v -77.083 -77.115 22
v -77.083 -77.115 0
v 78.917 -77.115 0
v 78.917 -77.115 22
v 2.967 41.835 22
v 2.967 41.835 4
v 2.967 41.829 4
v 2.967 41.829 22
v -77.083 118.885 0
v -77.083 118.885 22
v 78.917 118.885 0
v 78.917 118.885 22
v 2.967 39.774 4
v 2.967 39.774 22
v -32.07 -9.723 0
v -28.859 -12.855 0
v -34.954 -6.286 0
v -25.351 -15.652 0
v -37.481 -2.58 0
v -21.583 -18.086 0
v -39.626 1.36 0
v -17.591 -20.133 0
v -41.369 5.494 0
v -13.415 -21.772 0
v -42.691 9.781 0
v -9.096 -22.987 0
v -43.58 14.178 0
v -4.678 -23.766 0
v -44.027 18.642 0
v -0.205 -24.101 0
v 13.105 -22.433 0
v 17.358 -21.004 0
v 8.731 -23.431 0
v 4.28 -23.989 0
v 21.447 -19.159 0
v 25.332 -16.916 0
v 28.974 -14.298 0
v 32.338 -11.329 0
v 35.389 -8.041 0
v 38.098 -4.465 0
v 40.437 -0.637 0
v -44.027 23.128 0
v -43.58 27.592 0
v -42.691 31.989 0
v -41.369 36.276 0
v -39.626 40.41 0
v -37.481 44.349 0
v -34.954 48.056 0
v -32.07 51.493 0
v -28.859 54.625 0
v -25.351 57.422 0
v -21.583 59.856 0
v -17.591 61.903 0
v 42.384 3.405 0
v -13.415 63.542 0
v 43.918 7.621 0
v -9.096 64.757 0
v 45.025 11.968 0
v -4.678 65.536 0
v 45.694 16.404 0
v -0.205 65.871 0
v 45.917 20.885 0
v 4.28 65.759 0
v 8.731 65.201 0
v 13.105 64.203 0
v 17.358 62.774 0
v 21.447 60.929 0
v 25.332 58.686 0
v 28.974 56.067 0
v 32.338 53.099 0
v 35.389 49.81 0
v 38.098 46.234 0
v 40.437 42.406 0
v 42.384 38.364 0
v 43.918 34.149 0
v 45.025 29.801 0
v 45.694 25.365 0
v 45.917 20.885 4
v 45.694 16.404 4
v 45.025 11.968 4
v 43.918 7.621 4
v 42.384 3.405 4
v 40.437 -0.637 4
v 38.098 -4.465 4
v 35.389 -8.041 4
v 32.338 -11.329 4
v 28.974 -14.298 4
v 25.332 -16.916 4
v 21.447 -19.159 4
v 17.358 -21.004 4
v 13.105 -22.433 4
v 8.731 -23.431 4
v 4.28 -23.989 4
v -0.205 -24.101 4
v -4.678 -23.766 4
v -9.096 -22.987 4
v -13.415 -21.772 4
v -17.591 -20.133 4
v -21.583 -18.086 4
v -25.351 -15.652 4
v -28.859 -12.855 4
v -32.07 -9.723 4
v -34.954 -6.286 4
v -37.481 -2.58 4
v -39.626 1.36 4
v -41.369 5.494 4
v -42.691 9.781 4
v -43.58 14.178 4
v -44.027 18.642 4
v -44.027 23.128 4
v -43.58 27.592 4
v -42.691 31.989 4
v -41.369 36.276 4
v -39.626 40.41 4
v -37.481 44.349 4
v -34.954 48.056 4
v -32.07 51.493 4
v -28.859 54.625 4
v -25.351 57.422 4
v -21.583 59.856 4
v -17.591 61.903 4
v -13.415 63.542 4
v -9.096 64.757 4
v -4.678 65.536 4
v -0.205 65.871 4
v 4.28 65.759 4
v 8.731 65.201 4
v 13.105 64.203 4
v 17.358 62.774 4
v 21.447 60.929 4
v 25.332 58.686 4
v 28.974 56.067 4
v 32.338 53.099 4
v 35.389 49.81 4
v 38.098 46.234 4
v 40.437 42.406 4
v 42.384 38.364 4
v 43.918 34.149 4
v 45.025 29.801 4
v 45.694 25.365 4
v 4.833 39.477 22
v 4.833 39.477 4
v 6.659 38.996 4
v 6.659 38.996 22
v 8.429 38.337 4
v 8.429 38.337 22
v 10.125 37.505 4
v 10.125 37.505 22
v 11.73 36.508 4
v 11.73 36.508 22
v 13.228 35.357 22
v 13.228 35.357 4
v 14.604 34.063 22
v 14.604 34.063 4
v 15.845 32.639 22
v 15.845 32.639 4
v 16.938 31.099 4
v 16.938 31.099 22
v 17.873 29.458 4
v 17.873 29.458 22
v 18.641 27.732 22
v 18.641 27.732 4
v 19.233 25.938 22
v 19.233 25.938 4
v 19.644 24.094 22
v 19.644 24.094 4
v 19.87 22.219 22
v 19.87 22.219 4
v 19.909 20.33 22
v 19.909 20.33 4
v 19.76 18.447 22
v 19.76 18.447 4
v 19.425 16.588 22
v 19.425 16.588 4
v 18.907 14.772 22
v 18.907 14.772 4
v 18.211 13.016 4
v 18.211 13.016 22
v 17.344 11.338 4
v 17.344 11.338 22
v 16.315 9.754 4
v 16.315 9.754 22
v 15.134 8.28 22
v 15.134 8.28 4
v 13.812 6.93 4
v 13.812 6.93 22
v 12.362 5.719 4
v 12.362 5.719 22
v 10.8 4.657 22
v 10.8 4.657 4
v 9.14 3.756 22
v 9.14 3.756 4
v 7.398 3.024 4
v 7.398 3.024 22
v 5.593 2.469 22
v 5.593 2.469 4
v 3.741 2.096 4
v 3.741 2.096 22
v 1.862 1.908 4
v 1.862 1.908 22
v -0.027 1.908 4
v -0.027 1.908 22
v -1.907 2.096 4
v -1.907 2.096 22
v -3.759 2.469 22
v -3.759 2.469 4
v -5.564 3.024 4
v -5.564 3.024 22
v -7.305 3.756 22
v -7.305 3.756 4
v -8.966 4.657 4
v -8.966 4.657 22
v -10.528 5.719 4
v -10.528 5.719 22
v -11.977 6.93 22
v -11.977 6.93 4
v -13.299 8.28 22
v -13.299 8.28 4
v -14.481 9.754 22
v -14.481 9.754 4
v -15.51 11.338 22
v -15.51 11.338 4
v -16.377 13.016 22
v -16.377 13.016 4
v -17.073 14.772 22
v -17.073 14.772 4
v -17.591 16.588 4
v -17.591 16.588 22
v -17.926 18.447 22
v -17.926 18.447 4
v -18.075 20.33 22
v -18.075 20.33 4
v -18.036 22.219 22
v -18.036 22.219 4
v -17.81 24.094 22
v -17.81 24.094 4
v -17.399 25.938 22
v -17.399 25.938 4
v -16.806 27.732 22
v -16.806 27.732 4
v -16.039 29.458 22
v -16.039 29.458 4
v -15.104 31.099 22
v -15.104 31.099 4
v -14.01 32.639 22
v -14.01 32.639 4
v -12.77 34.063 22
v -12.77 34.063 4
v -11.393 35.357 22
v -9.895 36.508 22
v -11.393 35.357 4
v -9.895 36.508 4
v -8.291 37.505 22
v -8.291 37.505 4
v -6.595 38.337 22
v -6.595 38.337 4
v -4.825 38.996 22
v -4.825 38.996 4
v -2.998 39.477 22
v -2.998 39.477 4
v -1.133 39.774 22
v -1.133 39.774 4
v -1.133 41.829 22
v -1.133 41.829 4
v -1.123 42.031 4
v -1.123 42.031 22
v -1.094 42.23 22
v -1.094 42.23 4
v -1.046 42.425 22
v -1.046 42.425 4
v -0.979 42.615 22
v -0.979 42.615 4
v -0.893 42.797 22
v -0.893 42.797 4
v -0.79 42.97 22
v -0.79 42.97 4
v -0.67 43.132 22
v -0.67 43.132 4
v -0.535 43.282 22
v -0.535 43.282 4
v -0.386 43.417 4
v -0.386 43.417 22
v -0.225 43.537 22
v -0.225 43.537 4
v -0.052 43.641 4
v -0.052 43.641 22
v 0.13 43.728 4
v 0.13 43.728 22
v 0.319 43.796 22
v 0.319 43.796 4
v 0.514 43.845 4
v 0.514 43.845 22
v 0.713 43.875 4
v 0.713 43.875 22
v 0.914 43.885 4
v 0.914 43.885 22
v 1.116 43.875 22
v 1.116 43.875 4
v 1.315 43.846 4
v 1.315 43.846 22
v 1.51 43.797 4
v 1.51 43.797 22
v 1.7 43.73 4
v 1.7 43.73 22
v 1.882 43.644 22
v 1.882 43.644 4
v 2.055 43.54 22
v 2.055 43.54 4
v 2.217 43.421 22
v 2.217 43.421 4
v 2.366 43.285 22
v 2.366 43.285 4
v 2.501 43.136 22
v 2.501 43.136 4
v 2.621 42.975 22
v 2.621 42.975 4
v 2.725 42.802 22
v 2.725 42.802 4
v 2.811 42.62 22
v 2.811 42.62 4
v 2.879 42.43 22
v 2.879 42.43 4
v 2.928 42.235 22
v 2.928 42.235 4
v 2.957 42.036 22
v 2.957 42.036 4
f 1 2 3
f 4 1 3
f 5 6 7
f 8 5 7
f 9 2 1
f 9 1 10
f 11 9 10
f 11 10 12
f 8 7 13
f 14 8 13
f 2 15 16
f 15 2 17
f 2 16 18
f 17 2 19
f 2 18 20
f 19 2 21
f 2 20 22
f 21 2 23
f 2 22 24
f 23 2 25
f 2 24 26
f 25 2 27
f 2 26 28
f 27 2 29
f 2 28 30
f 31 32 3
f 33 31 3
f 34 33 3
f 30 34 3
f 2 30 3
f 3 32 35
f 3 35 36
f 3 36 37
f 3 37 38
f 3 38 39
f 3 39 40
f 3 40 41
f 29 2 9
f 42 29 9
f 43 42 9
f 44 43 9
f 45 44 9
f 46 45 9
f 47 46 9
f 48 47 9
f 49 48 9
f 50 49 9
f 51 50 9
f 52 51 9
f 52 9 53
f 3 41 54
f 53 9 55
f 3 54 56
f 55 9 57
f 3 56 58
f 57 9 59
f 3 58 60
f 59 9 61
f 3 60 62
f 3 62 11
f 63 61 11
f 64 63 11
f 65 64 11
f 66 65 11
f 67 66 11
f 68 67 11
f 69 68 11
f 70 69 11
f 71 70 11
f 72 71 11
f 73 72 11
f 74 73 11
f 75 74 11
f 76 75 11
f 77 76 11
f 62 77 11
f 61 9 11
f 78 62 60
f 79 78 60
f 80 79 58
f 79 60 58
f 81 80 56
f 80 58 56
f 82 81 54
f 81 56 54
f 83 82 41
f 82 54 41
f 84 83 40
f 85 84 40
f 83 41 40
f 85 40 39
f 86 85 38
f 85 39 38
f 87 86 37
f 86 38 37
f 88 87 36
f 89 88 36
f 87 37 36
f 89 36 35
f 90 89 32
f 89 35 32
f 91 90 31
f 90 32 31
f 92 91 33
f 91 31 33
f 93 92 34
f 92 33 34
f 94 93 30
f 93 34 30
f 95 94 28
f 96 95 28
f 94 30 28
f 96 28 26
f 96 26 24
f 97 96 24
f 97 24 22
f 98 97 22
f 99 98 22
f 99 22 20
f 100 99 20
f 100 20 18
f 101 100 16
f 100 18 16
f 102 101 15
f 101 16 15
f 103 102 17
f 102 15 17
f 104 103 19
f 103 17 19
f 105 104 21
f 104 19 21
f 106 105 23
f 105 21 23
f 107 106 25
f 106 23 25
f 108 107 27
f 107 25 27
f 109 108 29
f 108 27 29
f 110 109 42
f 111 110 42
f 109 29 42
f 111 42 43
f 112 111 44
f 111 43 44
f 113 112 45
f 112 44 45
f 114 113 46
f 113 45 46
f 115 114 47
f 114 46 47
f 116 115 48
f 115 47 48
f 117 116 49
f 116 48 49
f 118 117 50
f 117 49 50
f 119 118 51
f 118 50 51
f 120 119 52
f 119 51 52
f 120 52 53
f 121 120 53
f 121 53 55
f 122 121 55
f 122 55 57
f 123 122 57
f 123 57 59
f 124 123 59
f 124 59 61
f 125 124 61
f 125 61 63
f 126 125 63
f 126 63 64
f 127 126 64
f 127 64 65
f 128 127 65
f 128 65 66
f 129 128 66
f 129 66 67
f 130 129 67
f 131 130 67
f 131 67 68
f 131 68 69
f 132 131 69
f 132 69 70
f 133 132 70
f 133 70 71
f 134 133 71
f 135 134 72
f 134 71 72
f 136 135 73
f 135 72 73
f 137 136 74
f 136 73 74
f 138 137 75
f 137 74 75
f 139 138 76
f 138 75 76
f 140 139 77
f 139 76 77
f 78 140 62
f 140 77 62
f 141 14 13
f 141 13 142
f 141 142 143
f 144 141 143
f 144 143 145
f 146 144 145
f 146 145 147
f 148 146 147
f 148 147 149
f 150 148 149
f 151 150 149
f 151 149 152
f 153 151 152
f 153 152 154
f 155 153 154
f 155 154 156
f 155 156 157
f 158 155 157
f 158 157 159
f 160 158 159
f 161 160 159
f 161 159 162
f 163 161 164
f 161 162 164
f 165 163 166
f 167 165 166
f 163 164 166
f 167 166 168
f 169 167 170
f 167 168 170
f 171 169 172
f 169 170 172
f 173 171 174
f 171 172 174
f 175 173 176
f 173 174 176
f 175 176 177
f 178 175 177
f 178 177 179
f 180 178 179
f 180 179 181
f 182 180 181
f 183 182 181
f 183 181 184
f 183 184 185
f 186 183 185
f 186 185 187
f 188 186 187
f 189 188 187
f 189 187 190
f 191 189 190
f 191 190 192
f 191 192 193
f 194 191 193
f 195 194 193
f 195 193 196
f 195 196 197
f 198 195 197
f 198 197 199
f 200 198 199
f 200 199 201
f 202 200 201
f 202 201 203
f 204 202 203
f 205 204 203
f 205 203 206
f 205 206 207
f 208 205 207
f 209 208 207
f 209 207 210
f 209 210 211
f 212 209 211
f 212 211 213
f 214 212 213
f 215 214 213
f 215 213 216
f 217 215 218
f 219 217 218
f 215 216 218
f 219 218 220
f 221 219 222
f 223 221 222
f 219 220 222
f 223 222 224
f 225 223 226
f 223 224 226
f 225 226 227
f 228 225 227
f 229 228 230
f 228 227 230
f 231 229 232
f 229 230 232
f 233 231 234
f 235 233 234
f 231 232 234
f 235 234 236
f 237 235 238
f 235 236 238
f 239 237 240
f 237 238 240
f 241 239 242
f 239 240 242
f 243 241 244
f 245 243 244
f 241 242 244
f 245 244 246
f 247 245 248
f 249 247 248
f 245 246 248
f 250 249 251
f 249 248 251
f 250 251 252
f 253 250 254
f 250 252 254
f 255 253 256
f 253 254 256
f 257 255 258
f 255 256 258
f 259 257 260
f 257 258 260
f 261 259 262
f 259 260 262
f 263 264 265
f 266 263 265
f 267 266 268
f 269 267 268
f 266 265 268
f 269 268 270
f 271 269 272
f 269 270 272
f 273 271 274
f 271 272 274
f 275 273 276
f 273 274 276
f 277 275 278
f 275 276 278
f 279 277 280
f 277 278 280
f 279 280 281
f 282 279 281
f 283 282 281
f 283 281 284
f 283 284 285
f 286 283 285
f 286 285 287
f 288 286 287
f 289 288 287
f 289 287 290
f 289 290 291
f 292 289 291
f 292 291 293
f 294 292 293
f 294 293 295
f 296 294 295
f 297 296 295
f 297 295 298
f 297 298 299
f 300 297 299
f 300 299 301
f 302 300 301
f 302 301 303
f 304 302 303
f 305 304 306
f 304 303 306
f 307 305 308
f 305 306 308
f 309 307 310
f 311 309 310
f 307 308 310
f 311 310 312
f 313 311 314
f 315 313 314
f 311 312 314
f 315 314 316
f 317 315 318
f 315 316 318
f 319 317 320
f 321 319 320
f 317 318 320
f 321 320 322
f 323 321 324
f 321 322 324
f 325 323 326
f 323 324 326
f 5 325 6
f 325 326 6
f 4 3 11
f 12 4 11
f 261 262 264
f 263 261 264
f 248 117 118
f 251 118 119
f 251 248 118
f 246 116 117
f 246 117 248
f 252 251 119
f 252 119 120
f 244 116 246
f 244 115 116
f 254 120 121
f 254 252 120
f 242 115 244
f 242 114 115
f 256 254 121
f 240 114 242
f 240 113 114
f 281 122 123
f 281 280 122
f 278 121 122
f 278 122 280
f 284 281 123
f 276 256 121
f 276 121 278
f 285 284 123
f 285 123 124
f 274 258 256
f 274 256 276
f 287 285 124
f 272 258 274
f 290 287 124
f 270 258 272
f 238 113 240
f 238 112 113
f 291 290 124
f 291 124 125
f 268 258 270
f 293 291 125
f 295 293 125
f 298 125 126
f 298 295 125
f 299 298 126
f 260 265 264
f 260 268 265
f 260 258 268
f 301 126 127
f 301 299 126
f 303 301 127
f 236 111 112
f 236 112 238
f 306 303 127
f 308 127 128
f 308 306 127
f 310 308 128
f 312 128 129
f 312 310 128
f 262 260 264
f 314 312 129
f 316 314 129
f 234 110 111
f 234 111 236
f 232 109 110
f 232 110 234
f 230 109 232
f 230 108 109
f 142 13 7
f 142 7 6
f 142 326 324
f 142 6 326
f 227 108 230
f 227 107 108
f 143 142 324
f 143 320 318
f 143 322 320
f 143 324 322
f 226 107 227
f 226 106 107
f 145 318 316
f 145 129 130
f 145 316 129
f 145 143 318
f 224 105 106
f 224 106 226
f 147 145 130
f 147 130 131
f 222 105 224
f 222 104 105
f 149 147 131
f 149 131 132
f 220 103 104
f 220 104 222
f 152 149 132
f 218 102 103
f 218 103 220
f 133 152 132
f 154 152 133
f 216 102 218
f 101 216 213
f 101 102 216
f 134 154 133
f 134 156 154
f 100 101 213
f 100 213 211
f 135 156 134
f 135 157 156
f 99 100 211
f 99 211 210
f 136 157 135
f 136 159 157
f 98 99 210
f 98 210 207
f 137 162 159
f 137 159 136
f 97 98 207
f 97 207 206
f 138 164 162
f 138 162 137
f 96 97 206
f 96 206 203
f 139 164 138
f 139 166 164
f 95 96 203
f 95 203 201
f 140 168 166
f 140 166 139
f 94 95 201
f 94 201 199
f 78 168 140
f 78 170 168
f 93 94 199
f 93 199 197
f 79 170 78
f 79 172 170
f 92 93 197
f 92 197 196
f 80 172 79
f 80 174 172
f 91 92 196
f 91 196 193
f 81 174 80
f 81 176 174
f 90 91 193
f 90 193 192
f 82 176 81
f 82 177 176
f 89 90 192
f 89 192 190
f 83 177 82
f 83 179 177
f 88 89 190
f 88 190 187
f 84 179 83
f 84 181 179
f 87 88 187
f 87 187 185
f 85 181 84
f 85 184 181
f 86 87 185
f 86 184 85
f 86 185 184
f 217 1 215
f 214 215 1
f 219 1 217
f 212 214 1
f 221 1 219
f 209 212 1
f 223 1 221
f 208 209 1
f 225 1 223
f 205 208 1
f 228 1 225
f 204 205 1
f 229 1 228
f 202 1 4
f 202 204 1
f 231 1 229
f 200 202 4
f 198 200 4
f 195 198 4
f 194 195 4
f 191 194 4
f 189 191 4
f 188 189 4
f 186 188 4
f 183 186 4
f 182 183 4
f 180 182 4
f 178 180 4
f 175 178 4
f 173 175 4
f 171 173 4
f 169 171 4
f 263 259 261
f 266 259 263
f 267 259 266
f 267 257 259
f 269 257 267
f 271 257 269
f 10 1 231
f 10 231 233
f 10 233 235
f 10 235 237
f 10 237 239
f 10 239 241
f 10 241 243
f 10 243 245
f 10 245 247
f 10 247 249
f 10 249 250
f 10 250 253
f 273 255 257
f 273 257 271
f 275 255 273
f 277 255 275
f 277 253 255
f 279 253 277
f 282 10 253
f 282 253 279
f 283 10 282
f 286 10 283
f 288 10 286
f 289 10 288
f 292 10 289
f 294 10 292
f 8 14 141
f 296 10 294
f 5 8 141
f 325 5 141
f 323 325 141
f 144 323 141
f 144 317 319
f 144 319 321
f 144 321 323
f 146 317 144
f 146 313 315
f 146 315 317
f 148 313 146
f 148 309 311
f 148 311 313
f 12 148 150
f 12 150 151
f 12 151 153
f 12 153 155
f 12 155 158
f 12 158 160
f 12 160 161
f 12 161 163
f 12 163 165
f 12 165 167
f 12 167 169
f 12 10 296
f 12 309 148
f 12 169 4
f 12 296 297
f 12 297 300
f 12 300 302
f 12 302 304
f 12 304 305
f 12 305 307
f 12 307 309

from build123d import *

# Parameters (mm, degrees)
F0_W     = 156
F0_H     = 196
F1_DEPTH = 22
F2_DEPTH = 4
F3_R     = 45
F4_DEPTH = 4


# Not quite as in the source:
# - ends of sketch curves that miss each other by under 0.0002 mm in the source are joined


with BuildPart() as f1:
    # F0 (on Top) → F1 (new body)
    with BuildSketch(Plane.XY):
        with Locations((0.9172109421, 20.8848945383)):
            Rectangle(F0_W, F0_H)
        with BuildLine():
            ThreePointArc((2.9672109421, 39.7739786876), (0.9172109421, 1.8848945383), (-1.1327890579, 39.7739786876))
            Line((-1.1327890579, 39.7739786876), (-1.1327890579, 41.8294366129))
            ThreePointArc((-1.1327890579, 41.8294366129), (0.914481977, 43.8848999875), (2.9672182077, 41.8348945383))
            Line((2.9672182077, 41.8348945383), (2.9672109421, 41.8294366129))
            Line((2.9672109421, 41.8294366129), (2.9672109421, 39.7739786876))
        make_face(mode=Mode.SUBTRACT)
    extrude(amount=F1_DEPTH)

    # F0 (on Top) → F2 (join)
    with BuildSketch(Plane.XY):
        with Locations((0.9172109421, 20.8848945383)):
            Rectangle(F0_W, F0_H)
        with BuildLine():
            ThreePointArc((2.9672109421, 39.7739786876), (0.9172109421, 1.8848945383), (-1.1327890579, 39.7739786876))
            Line((-1.1327890579, 39.7739786876), (-1.1327890579, 41.8294366129))
            ThreePointArc((-1.1327890579, 41.8294366129), (0.914481977, 43.8848999875), (2.9672182077, 41.8348945383))
            Line((2.9672182077, 41.8348945383), (2.9672109421, 41.8294366129))
            Line((2.9672109421, 41.8294366129), (2.9672109421, 39.7739786876))
        make_face(mode=Mode.SUBTRACT)
    extrude(amount=F2_DEPTH)

    # F3 (on face) → F4 (cut)
    with BuildSketch(Plane(origin=(0, 0, 0), x_dir=(1, 0, 0), z_dir=(0, 0, -1))):
        with Locations((0.9172109421, -20.8848945383)):
            Circle(F3_R)
    extrude(amount=-F4_DEPTH, mode=Mode.SUBTRACT)


solid = f1.part
